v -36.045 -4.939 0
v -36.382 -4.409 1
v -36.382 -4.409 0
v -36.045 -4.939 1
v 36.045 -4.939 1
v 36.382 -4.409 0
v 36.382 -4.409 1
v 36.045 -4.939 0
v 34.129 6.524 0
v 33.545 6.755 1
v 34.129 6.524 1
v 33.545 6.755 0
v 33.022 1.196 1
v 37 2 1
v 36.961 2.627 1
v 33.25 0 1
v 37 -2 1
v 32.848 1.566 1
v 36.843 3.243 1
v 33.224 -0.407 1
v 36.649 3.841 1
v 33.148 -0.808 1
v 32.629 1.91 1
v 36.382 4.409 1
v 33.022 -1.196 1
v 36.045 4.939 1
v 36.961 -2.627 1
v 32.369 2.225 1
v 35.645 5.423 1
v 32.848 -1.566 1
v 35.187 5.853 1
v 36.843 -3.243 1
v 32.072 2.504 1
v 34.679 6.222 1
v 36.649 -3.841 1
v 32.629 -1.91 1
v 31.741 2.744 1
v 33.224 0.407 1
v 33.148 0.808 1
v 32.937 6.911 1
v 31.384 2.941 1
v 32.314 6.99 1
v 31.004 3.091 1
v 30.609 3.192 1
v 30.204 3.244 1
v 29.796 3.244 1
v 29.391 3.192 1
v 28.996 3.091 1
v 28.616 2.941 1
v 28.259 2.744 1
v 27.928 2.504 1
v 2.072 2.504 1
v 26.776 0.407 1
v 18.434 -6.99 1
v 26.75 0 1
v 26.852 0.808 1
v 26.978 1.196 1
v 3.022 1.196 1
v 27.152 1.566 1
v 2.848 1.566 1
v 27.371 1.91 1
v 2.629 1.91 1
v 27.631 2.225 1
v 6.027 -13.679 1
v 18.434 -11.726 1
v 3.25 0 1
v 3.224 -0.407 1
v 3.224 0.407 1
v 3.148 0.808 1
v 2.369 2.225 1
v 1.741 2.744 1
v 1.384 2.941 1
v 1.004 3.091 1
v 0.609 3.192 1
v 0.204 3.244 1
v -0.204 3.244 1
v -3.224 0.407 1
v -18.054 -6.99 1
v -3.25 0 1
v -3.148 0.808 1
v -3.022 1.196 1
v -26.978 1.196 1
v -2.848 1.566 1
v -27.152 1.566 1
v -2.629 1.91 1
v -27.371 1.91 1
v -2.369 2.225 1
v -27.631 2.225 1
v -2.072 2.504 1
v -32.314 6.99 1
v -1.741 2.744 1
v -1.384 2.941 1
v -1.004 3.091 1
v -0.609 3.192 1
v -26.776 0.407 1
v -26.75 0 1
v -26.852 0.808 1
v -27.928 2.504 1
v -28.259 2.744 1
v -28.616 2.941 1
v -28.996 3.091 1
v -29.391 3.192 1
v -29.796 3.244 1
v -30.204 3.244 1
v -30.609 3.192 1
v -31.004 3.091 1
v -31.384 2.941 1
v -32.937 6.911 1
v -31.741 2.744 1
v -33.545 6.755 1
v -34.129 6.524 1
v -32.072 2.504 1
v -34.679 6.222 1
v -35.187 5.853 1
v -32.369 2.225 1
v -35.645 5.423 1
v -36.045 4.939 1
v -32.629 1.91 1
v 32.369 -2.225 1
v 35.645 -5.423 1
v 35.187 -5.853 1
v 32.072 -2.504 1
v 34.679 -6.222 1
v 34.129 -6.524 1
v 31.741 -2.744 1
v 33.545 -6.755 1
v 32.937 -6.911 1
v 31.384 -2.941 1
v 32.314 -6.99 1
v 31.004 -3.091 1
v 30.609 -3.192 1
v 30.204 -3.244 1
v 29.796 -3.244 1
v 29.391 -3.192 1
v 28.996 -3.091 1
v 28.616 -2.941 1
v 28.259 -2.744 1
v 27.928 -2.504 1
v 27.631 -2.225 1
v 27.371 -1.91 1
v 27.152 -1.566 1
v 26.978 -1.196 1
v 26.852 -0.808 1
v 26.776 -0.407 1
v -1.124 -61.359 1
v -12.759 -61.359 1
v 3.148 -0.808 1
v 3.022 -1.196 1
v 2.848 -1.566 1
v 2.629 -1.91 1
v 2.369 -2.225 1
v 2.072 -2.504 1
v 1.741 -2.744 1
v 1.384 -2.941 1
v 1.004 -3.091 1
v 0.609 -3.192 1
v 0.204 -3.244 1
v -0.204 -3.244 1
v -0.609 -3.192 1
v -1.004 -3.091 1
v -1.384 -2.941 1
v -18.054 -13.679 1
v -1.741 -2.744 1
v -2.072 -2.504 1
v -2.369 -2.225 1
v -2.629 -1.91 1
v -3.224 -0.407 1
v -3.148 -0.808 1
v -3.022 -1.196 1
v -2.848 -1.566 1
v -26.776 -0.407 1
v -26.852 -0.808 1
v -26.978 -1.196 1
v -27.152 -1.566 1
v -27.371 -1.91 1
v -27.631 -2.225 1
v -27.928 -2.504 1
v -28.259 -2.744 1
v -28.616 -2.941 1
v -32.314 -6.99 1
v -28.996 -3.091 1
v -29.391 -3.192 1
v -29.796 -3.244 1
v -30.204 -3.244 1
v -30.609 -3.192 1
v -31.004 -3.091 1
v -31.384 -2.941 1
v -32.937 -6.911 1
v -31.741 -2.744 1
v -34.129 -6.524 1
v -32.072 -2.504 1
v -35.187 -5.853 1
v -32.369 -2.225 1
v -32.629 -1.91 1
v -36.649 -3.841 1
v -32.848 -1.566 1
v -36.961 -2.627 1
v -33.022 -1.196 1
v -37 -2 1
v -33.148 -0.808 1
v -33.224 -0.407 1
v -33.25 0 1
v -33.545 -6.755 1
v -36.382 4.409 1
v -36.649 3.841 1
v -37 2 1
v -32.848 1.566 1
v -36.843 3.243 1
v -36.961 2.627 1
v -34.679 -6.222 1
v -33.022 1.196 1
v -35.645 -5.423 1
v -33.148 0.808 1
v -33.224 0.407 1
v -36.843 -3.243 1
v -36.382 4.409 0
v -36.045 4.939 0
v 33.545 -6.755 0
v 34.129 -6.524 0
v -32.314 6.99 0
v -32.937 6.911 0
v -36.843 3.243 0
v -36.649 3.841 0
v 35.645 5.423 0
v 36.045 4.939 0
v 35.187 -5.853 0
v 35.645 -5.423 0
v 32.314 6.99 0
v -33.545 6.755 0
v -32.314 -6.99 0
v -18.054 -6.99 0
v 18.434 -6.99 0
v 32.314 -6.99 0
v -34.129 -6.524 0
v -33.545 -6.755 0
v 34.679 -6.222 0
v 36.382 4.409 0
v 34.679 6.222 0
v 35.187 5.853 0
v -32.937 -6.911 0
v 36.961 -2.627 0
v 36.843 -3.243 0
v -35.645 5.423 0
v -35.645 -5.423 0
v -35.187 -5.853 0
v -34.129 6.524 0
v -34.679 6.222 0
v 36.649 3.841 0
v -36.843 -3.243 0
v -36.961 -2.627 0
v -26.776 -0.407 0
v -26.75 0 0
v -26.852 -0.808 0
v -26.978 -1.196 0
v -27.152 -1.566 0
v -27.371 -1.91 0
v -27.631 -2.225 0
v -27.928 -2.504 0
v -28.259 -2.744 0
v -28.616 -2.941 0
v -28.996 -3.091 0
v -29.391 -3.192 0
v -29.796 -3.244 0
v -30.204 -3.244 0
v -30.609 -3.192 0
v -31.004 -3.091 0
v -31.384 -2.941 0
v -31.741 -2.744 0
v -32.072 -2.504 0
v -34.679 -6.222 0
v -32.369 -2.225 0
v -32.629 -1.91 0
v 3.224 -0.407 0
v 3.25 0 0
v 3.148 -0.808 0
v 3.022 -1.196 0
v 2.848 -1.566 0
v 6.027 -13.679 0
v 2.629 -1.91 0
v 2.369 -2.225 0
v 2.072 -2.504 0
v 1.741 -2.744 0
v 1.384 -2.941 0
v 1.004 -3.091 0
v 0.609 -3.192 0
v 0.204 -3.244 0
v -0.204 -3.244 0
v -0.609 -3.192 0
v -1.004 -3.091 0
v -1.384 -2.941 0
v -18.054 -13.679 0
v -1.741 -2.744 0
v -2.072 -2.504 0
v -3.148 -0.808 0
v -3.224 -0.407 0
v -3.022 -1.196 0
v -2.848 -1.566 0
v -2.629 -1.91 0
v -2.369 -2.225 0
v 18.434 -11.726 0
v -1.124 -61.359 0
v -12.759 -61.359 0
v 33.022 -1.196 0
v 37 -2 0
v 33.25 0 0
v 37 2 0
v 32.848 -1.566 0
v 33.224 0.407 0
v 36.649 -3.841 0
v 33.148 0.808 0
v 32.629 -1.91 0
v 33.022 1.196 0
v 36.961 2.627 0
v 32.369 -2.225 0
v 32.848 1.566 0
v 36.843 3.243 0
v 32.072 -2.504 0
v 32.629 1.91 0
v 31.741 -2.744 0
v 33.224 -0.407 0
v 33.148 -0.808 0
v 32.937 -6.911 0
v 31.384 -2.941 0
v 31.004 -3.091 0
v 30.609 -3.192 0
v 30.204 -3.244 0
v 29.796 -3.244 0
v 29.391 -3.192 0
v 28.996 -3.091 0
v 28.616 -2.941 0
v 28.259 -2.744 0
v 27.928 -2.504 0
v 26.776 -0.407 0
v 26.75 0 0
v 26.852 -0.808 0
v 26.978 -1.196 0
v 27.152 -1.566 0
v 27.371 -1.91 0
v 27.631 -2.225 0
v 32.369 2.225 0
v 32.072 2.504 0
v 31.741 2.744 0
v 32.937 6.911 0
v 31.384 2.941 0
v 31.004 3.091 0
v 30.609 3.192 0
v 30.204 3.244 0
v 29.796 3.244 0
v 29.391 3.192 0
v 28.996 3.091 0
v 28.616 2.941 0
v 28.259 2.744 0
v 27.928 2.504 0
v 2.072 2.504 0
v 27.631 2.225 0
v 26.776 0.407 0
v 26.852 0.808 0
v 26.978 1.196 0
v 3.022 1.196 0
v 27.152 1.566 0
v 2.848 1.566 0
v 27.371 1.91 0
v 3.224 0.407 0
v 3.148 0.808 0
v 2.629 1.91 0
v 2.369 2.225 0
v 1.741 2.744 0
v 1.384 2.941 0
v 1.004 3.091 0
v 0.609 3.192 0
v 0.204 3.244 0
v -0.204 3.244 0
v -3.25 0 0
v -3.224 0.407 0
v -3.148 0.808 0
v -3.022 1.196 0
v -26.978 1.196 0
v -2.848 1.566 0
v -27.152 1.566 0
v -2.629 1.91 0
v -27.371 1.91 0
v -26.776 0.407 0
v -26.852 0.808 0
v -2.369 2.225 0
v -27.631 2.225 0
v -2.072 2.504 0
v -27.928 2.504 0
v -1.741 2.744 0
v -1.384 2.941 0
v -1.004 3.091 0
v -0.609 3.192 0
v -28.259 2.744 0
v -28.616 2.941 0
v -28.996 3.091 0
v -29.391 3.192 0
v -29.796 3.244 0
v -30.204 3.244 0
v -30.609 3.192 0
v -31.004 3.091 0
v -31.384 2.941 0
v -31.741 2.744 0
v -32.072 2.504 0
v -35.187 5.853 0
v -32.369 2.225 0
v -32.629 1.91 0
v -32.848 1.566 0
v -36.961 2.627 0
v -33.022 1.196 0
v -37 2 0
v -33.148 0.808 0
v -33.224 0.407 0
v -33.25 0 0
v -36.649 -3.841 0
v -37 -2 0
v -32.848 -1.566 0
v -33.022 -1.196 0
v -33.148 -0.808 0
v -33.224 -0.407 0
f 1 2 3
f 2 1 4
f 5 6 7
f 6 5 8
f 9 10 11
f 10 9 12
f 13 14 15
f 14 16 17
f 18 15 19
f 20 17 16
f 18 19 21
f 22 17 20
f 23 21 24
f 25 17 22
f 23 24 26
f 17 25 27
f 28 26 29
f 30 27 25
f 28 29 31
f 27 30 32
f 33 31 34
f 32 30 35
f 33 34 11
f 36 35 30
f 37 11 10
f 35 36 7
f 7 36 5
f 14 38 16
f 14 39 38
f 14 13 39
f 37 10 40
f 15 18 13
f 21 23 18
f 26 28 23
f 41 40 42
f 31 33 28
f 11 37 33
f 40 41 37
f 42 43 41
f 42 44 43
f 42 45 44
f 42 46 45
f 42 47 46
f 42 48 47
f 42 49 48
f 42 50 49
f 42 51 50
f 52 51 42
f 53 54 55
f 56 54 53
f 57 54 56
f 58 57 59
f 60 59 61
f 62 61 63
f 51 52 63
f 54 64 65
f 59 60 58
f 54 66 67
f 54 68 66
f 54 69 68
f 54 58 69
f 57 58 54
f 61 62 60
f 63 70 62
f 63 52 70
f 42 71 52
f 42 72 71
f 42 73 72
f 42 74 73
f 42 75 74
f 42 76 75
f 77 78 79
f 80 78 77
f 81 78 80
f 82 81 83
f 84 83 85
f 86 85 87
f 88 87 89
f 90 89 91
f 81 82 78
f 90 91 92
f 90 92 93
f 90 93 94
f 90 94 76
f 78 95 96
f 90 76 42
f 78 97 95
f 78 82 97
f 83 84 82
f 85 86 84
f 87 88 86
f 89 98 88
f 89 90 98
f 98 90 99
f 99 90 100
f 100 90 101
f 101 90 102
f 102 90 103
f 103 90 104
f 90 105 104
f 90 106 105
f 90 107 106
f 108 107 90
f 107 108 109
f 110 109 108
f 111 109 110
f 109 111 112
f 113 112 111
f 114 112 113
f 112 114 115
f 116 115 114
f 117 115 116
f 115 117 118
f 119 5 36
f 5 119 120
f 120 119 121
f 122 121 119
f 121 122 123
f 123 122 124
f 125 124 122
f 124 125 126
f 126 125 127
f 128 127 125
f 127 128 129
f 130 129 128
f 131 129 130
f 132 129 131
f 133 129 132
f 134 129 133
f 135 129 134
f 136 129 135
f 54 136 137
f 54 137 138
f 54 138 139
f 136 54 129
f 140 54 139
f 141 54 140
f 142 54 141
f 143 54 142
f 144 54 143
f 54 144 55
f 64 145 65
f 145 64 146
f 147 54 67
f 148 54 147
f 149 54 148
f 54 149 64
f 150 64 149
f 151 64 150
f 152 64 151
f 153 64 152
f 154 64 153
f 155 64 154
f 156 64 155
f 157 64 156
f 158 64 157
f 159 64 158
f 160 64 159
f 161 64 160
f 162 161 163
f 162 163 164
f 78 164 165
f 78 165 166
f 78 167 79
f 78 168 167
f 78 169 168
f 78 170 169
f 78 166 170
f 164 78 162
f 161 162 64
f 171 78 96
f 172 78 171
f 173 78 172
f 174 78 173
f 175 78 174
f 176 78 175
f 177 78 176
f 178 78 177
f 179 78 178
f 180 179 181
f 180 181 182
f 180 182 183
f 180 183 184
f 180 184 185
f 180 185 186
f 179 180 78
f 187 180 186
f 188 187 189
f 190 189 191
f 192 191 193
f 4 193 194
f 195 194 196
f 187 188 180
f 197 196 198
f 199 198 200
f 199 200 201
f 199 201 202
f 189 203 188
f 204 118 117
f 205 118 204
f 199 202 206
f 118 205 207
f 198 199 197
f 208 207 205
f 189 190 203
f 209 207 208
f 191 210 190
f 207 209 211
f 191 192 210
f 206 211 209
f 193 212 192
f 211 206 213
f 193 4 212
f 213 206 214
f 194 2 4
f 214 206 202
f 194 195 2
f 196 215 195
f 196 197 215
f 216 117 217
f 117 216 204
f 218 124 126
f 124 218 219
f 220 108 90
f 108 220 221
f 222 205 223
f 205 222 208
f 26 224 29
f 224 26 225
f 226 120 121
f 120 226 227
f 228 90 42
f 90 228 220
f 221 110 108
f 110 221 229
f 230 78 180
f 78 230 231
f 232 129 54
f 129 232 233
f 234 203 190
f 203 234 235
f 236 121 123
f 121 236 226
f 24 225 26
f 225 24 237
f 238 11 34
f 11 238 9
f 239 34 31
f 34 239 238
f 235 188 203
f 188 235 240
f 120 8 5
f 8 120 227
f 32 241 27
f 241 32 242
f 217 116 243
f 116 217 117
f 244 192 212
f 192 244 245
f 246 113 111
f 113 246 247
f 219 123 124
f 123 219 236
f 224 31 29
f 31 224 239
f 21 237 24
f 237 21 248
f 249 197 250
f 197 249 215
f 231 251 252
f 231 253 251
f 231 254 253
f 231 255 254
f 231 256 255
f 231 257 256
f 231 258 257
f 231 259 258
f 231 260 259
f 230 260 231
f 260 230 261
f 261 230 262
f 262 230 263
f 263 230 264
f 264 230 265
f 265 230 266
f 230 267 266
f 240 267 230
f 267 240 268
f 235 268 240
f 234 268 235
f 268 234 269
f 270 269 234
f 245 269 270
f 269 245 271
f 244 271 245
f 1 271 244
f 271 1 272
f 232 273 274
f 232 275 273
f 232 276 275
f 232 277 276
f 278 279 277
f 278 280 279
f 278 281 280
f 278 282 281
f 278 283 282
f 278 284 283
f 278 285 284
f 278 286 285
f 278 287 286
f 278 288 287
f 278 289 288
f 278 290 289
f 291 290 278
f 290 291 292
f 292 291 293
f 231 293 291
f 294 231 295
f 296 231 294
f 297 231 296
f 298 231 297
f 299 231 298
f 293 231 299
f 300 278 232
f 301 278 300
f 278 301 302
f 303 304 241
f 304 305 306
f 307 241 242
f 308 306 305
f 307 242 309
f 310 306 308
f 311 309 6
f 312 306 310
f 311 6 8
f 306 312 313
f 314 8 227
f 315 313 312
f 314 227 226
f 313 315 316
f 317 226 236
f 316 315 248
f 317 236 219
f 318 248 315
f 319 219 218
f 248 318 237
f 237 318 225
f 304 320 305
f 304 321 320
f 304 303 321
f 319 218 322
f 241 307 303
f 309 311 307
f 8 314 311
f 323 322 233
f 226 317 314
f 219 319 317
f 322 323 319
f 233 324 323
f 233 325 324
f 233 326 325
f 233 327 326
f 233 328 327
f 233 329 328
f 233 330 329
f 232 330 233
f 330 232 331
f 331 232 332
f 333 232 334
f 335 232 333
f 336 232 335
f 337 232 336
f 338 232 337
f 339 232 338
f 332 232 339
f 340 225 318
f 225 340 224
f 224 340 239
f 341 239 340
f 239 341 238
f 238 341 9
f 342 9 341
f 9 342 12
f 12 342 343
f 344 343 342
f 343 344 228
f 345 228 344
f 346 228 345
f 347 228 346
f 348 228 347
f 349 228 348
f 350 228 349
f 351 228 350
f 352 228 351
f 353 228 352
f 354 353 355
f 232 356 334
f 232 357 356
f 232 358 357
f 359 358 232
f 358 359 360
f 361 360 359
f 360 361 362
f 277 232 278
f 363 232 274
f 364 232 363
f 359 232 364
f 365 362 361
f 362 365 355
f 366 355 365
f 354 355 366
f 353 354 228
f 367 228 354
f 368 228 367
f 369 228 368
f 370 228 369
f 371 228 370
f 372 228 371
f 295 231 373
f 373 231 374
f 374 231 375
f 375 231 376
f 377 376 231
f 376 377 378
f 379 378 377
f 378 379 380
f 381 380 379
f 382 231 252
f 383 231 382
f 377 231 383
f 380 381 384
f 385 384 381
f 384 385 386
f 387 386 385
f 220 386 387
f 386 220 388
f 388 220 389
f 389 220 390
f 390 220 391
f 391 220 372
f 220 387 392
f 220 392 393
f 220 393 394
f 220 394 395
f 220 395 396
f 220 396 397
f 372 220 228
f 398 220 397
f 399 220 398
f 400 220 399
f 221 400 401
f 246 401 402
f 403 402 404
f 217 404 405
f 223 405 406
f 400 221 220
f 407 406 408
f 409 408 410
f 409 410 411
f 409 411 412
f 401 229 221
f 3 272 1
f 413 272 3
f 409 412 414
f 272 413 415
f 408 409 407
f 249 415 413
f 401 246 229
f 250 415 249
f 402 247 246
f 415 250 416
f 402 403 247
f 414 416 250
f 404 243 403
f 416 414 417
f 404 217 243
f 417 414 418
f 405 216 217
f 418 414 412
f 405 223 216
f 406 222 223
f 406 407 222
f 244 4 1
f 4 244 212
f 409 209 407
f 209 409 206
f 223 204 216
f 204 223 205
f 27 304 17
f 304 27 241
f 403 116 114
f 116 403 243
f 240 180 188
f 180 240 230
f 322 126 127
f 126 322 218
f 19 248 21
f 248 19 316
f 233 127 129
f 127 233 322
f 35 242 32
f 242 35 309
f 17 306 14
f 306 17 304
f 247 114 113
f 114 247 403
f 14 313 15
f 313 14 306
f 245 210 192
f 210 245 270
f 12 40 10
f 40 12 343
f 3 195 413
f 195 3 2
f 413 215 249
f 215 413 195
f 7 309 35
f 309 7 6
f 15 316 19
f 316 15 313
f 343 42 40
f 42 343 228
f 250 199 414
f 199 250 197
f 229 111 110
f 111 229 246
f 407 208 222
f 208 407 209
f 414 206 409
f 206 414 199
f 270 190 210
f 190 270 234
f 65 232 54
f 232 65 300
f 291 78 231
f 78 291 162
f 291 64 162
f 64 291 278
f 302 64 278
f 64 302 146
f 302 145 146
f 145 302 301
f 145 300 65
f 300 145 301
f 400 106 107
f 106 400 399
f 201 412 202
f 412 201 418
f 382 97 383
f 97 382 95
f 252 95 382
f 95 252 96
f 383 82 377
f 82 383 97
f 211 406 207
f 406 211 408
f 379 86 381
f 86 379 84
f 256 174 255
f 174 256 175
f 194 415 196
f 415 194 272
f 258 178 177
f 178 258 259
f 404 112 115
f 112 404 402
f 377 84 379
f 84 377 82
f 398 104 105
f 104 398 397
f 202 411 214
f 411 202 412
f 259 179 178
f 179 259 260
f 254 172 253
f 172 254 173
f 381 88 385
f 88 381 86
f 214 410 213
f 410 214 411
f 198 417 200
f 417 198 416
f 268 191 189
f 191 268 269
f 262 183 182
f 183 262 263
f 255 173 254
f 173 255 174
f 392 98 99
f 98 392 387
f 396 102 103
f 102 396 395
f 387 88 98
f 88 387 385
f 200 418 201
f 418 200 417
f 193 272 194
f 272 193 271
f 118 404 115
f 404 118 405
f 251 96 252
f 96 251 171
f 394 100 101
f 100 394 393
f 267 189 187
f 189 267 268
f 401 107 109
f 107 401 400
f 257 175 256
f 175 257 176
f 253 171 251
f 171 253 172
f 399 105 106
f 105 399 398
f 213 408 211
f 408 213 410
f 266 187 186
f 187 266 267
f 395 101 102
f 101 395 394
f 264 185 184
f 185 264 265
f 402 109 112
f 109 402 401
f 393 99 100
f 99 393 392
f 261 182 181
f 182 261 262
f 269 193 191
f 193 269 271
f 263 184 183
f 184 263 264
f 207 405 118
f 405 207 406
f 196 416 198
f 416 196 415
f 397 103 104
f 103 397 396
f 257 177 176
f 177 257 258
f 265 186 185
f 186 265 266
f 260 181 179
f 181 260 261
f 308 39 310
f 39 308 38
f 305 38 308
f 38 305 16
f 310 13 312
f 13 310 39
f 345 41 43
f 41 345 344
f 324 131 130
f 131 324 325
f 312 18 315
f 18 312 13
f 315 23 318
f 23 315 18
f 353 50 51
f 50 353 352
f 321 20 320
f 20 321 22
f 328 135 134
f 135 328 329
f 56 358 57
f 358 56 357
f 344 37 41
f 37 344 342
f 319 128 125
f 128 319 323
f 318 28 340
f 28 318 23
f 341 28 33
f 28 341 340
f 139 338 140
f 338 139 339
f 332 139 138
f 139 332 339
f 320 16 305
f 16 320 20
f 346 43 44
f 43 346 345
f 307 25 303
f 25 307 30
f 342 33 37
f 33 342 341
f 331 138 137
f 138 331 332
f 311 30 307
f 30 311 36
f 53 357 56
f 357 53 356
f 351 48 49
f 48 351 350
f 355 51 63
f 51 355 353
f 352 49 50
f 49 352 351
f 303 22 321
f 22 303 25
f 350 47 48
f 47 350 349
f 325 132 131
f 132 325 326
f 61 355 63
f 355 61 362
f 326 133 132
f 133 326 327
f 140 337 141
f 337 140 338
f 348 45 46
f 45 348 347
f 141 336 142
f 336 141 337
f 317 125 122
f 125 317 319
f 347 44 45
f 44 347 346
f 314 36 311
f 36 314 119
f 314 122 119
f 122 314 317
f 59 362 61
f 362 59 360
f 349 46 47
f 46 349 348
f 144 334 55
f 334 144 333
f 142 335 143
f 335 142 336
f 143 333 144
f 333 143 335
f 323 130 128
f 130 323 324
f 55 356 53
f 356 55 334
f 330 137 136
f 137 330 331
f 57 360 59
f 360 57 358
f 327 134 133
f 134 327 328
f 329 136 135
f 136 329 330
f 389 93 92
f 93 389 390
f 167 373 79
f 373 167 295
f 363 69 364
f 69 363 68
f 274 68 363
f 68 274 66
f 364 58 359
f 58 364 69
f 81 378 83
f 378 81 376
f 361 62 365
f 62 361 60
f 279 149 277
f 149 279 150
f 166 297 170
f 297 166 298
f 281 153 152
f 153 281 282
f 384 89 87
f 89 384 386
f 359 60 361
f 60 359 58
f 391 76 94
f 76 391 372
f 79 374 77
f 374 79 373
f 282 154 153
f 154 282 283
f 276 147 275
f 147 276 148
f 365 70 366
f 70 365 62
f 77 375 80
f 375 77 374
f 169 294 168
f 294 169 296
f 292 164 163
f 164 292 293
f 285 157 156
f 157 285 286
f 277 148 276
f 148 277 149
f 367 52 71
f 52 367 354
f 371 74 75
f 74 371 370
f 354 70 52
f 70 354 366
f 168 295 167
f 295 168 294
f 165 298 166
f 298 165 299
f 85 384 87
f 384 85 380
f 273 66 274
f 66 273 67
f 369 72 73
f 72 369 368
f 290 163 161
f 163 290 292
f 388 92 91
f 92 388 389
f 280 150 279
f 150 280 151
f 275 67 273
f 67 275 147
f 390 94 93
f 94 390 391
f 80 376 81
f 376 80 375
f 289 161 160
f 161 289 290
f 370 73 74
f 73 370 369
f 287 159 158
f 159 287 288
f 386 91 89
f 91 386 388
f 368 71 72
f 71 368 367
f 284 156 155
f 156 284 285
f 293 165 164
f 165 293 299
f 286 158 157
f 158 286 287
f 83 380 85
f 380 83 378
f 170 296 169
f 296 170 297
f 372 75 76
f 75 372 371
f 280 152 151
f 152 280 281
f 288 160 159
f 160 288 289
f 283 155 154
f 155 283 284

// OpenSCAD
$fn = 50;


difference() {
	union() {
		translate(v = [0, 0, 0]) {
			rotate(a = [0, 0, 0]) {
				hull() {
					translate(v = [-32.0000000000, 2.0000000000, 0]) {
						rotate(a = [0, 0, 0]) {
							translate(v = [0, 0, 0]) {
								rotate(a = [0, 0, 0]) {
									cylinder(h = 1, r = 5);
								}
							}
						}
					}
					translate(v = [32.0000000000, 2.0000000000, 0]) {
						rotate(a = [0, 0, 0]) {
							translate(v = [0, 0, 0]) {
								rotate(a = [0, 0, 0]) {
									cylinder(h = 1, r = 5);
								}
							}
						}
					}
					translate(v = [-32.0000000000, -2.0000000000, 0]) {
						rotate(a = [0, 0, 0]) {
							translate(v = [0, 0, 0]) {
								rotate(a = [0, 0, 0]) {
									cylinder(h = 1, r = 5);
								}
							}
						}
					}
					translate(v = [32.0000000000, -2.0000000000, 0]) {
						rotate(a = [0, 0, 0]) {
							translate(v = [0, 0, 0]) {
								rotate(a = [0, 0, 0]) {
									cylinder(h = 1, r = 5);
								}
							}
						}
					}
				}
			}
		}
		translate(v = [0, -5, 0]) {
			rotate(a = [0, 0, 0]) {
				linear_extrude(height = 1) {
					text(font = "DejaVu Sans Mono:style=Bold", halign = "center", size = 57.0000000000, text = "7", valign = "top");
				}
			}
		}
	}
	union() {
		translate(v = [-30.0000000000, 0.0000000000, -125.0000000000]) {
			rotate(a = [0, 0, 0]) {
				cylinder(h = 250, r = 3.2500000000);
			}
		}
		translate(v = [30.0000000000, 0.0000000000, -125.0000000000]) {
			rotate(a = [0, 0, 0]) {
				cylinder(h = 250, r = 3.2500000000);
			}
		}
		translate(v = [30.0000000000, 0.0000000000, -125.0000000000]) {
			rotate(a = [0, 0, 0]) {
				cylinder(h = 250, r = 3.2500000000);
			}
		}
		translate(v = [0, 0, -125.0000000000]) {
			rotate(a = [0, 0, 0]) {
				cylinder(h = 250, r = 3.2500000000);
			}
		}
	}
}
